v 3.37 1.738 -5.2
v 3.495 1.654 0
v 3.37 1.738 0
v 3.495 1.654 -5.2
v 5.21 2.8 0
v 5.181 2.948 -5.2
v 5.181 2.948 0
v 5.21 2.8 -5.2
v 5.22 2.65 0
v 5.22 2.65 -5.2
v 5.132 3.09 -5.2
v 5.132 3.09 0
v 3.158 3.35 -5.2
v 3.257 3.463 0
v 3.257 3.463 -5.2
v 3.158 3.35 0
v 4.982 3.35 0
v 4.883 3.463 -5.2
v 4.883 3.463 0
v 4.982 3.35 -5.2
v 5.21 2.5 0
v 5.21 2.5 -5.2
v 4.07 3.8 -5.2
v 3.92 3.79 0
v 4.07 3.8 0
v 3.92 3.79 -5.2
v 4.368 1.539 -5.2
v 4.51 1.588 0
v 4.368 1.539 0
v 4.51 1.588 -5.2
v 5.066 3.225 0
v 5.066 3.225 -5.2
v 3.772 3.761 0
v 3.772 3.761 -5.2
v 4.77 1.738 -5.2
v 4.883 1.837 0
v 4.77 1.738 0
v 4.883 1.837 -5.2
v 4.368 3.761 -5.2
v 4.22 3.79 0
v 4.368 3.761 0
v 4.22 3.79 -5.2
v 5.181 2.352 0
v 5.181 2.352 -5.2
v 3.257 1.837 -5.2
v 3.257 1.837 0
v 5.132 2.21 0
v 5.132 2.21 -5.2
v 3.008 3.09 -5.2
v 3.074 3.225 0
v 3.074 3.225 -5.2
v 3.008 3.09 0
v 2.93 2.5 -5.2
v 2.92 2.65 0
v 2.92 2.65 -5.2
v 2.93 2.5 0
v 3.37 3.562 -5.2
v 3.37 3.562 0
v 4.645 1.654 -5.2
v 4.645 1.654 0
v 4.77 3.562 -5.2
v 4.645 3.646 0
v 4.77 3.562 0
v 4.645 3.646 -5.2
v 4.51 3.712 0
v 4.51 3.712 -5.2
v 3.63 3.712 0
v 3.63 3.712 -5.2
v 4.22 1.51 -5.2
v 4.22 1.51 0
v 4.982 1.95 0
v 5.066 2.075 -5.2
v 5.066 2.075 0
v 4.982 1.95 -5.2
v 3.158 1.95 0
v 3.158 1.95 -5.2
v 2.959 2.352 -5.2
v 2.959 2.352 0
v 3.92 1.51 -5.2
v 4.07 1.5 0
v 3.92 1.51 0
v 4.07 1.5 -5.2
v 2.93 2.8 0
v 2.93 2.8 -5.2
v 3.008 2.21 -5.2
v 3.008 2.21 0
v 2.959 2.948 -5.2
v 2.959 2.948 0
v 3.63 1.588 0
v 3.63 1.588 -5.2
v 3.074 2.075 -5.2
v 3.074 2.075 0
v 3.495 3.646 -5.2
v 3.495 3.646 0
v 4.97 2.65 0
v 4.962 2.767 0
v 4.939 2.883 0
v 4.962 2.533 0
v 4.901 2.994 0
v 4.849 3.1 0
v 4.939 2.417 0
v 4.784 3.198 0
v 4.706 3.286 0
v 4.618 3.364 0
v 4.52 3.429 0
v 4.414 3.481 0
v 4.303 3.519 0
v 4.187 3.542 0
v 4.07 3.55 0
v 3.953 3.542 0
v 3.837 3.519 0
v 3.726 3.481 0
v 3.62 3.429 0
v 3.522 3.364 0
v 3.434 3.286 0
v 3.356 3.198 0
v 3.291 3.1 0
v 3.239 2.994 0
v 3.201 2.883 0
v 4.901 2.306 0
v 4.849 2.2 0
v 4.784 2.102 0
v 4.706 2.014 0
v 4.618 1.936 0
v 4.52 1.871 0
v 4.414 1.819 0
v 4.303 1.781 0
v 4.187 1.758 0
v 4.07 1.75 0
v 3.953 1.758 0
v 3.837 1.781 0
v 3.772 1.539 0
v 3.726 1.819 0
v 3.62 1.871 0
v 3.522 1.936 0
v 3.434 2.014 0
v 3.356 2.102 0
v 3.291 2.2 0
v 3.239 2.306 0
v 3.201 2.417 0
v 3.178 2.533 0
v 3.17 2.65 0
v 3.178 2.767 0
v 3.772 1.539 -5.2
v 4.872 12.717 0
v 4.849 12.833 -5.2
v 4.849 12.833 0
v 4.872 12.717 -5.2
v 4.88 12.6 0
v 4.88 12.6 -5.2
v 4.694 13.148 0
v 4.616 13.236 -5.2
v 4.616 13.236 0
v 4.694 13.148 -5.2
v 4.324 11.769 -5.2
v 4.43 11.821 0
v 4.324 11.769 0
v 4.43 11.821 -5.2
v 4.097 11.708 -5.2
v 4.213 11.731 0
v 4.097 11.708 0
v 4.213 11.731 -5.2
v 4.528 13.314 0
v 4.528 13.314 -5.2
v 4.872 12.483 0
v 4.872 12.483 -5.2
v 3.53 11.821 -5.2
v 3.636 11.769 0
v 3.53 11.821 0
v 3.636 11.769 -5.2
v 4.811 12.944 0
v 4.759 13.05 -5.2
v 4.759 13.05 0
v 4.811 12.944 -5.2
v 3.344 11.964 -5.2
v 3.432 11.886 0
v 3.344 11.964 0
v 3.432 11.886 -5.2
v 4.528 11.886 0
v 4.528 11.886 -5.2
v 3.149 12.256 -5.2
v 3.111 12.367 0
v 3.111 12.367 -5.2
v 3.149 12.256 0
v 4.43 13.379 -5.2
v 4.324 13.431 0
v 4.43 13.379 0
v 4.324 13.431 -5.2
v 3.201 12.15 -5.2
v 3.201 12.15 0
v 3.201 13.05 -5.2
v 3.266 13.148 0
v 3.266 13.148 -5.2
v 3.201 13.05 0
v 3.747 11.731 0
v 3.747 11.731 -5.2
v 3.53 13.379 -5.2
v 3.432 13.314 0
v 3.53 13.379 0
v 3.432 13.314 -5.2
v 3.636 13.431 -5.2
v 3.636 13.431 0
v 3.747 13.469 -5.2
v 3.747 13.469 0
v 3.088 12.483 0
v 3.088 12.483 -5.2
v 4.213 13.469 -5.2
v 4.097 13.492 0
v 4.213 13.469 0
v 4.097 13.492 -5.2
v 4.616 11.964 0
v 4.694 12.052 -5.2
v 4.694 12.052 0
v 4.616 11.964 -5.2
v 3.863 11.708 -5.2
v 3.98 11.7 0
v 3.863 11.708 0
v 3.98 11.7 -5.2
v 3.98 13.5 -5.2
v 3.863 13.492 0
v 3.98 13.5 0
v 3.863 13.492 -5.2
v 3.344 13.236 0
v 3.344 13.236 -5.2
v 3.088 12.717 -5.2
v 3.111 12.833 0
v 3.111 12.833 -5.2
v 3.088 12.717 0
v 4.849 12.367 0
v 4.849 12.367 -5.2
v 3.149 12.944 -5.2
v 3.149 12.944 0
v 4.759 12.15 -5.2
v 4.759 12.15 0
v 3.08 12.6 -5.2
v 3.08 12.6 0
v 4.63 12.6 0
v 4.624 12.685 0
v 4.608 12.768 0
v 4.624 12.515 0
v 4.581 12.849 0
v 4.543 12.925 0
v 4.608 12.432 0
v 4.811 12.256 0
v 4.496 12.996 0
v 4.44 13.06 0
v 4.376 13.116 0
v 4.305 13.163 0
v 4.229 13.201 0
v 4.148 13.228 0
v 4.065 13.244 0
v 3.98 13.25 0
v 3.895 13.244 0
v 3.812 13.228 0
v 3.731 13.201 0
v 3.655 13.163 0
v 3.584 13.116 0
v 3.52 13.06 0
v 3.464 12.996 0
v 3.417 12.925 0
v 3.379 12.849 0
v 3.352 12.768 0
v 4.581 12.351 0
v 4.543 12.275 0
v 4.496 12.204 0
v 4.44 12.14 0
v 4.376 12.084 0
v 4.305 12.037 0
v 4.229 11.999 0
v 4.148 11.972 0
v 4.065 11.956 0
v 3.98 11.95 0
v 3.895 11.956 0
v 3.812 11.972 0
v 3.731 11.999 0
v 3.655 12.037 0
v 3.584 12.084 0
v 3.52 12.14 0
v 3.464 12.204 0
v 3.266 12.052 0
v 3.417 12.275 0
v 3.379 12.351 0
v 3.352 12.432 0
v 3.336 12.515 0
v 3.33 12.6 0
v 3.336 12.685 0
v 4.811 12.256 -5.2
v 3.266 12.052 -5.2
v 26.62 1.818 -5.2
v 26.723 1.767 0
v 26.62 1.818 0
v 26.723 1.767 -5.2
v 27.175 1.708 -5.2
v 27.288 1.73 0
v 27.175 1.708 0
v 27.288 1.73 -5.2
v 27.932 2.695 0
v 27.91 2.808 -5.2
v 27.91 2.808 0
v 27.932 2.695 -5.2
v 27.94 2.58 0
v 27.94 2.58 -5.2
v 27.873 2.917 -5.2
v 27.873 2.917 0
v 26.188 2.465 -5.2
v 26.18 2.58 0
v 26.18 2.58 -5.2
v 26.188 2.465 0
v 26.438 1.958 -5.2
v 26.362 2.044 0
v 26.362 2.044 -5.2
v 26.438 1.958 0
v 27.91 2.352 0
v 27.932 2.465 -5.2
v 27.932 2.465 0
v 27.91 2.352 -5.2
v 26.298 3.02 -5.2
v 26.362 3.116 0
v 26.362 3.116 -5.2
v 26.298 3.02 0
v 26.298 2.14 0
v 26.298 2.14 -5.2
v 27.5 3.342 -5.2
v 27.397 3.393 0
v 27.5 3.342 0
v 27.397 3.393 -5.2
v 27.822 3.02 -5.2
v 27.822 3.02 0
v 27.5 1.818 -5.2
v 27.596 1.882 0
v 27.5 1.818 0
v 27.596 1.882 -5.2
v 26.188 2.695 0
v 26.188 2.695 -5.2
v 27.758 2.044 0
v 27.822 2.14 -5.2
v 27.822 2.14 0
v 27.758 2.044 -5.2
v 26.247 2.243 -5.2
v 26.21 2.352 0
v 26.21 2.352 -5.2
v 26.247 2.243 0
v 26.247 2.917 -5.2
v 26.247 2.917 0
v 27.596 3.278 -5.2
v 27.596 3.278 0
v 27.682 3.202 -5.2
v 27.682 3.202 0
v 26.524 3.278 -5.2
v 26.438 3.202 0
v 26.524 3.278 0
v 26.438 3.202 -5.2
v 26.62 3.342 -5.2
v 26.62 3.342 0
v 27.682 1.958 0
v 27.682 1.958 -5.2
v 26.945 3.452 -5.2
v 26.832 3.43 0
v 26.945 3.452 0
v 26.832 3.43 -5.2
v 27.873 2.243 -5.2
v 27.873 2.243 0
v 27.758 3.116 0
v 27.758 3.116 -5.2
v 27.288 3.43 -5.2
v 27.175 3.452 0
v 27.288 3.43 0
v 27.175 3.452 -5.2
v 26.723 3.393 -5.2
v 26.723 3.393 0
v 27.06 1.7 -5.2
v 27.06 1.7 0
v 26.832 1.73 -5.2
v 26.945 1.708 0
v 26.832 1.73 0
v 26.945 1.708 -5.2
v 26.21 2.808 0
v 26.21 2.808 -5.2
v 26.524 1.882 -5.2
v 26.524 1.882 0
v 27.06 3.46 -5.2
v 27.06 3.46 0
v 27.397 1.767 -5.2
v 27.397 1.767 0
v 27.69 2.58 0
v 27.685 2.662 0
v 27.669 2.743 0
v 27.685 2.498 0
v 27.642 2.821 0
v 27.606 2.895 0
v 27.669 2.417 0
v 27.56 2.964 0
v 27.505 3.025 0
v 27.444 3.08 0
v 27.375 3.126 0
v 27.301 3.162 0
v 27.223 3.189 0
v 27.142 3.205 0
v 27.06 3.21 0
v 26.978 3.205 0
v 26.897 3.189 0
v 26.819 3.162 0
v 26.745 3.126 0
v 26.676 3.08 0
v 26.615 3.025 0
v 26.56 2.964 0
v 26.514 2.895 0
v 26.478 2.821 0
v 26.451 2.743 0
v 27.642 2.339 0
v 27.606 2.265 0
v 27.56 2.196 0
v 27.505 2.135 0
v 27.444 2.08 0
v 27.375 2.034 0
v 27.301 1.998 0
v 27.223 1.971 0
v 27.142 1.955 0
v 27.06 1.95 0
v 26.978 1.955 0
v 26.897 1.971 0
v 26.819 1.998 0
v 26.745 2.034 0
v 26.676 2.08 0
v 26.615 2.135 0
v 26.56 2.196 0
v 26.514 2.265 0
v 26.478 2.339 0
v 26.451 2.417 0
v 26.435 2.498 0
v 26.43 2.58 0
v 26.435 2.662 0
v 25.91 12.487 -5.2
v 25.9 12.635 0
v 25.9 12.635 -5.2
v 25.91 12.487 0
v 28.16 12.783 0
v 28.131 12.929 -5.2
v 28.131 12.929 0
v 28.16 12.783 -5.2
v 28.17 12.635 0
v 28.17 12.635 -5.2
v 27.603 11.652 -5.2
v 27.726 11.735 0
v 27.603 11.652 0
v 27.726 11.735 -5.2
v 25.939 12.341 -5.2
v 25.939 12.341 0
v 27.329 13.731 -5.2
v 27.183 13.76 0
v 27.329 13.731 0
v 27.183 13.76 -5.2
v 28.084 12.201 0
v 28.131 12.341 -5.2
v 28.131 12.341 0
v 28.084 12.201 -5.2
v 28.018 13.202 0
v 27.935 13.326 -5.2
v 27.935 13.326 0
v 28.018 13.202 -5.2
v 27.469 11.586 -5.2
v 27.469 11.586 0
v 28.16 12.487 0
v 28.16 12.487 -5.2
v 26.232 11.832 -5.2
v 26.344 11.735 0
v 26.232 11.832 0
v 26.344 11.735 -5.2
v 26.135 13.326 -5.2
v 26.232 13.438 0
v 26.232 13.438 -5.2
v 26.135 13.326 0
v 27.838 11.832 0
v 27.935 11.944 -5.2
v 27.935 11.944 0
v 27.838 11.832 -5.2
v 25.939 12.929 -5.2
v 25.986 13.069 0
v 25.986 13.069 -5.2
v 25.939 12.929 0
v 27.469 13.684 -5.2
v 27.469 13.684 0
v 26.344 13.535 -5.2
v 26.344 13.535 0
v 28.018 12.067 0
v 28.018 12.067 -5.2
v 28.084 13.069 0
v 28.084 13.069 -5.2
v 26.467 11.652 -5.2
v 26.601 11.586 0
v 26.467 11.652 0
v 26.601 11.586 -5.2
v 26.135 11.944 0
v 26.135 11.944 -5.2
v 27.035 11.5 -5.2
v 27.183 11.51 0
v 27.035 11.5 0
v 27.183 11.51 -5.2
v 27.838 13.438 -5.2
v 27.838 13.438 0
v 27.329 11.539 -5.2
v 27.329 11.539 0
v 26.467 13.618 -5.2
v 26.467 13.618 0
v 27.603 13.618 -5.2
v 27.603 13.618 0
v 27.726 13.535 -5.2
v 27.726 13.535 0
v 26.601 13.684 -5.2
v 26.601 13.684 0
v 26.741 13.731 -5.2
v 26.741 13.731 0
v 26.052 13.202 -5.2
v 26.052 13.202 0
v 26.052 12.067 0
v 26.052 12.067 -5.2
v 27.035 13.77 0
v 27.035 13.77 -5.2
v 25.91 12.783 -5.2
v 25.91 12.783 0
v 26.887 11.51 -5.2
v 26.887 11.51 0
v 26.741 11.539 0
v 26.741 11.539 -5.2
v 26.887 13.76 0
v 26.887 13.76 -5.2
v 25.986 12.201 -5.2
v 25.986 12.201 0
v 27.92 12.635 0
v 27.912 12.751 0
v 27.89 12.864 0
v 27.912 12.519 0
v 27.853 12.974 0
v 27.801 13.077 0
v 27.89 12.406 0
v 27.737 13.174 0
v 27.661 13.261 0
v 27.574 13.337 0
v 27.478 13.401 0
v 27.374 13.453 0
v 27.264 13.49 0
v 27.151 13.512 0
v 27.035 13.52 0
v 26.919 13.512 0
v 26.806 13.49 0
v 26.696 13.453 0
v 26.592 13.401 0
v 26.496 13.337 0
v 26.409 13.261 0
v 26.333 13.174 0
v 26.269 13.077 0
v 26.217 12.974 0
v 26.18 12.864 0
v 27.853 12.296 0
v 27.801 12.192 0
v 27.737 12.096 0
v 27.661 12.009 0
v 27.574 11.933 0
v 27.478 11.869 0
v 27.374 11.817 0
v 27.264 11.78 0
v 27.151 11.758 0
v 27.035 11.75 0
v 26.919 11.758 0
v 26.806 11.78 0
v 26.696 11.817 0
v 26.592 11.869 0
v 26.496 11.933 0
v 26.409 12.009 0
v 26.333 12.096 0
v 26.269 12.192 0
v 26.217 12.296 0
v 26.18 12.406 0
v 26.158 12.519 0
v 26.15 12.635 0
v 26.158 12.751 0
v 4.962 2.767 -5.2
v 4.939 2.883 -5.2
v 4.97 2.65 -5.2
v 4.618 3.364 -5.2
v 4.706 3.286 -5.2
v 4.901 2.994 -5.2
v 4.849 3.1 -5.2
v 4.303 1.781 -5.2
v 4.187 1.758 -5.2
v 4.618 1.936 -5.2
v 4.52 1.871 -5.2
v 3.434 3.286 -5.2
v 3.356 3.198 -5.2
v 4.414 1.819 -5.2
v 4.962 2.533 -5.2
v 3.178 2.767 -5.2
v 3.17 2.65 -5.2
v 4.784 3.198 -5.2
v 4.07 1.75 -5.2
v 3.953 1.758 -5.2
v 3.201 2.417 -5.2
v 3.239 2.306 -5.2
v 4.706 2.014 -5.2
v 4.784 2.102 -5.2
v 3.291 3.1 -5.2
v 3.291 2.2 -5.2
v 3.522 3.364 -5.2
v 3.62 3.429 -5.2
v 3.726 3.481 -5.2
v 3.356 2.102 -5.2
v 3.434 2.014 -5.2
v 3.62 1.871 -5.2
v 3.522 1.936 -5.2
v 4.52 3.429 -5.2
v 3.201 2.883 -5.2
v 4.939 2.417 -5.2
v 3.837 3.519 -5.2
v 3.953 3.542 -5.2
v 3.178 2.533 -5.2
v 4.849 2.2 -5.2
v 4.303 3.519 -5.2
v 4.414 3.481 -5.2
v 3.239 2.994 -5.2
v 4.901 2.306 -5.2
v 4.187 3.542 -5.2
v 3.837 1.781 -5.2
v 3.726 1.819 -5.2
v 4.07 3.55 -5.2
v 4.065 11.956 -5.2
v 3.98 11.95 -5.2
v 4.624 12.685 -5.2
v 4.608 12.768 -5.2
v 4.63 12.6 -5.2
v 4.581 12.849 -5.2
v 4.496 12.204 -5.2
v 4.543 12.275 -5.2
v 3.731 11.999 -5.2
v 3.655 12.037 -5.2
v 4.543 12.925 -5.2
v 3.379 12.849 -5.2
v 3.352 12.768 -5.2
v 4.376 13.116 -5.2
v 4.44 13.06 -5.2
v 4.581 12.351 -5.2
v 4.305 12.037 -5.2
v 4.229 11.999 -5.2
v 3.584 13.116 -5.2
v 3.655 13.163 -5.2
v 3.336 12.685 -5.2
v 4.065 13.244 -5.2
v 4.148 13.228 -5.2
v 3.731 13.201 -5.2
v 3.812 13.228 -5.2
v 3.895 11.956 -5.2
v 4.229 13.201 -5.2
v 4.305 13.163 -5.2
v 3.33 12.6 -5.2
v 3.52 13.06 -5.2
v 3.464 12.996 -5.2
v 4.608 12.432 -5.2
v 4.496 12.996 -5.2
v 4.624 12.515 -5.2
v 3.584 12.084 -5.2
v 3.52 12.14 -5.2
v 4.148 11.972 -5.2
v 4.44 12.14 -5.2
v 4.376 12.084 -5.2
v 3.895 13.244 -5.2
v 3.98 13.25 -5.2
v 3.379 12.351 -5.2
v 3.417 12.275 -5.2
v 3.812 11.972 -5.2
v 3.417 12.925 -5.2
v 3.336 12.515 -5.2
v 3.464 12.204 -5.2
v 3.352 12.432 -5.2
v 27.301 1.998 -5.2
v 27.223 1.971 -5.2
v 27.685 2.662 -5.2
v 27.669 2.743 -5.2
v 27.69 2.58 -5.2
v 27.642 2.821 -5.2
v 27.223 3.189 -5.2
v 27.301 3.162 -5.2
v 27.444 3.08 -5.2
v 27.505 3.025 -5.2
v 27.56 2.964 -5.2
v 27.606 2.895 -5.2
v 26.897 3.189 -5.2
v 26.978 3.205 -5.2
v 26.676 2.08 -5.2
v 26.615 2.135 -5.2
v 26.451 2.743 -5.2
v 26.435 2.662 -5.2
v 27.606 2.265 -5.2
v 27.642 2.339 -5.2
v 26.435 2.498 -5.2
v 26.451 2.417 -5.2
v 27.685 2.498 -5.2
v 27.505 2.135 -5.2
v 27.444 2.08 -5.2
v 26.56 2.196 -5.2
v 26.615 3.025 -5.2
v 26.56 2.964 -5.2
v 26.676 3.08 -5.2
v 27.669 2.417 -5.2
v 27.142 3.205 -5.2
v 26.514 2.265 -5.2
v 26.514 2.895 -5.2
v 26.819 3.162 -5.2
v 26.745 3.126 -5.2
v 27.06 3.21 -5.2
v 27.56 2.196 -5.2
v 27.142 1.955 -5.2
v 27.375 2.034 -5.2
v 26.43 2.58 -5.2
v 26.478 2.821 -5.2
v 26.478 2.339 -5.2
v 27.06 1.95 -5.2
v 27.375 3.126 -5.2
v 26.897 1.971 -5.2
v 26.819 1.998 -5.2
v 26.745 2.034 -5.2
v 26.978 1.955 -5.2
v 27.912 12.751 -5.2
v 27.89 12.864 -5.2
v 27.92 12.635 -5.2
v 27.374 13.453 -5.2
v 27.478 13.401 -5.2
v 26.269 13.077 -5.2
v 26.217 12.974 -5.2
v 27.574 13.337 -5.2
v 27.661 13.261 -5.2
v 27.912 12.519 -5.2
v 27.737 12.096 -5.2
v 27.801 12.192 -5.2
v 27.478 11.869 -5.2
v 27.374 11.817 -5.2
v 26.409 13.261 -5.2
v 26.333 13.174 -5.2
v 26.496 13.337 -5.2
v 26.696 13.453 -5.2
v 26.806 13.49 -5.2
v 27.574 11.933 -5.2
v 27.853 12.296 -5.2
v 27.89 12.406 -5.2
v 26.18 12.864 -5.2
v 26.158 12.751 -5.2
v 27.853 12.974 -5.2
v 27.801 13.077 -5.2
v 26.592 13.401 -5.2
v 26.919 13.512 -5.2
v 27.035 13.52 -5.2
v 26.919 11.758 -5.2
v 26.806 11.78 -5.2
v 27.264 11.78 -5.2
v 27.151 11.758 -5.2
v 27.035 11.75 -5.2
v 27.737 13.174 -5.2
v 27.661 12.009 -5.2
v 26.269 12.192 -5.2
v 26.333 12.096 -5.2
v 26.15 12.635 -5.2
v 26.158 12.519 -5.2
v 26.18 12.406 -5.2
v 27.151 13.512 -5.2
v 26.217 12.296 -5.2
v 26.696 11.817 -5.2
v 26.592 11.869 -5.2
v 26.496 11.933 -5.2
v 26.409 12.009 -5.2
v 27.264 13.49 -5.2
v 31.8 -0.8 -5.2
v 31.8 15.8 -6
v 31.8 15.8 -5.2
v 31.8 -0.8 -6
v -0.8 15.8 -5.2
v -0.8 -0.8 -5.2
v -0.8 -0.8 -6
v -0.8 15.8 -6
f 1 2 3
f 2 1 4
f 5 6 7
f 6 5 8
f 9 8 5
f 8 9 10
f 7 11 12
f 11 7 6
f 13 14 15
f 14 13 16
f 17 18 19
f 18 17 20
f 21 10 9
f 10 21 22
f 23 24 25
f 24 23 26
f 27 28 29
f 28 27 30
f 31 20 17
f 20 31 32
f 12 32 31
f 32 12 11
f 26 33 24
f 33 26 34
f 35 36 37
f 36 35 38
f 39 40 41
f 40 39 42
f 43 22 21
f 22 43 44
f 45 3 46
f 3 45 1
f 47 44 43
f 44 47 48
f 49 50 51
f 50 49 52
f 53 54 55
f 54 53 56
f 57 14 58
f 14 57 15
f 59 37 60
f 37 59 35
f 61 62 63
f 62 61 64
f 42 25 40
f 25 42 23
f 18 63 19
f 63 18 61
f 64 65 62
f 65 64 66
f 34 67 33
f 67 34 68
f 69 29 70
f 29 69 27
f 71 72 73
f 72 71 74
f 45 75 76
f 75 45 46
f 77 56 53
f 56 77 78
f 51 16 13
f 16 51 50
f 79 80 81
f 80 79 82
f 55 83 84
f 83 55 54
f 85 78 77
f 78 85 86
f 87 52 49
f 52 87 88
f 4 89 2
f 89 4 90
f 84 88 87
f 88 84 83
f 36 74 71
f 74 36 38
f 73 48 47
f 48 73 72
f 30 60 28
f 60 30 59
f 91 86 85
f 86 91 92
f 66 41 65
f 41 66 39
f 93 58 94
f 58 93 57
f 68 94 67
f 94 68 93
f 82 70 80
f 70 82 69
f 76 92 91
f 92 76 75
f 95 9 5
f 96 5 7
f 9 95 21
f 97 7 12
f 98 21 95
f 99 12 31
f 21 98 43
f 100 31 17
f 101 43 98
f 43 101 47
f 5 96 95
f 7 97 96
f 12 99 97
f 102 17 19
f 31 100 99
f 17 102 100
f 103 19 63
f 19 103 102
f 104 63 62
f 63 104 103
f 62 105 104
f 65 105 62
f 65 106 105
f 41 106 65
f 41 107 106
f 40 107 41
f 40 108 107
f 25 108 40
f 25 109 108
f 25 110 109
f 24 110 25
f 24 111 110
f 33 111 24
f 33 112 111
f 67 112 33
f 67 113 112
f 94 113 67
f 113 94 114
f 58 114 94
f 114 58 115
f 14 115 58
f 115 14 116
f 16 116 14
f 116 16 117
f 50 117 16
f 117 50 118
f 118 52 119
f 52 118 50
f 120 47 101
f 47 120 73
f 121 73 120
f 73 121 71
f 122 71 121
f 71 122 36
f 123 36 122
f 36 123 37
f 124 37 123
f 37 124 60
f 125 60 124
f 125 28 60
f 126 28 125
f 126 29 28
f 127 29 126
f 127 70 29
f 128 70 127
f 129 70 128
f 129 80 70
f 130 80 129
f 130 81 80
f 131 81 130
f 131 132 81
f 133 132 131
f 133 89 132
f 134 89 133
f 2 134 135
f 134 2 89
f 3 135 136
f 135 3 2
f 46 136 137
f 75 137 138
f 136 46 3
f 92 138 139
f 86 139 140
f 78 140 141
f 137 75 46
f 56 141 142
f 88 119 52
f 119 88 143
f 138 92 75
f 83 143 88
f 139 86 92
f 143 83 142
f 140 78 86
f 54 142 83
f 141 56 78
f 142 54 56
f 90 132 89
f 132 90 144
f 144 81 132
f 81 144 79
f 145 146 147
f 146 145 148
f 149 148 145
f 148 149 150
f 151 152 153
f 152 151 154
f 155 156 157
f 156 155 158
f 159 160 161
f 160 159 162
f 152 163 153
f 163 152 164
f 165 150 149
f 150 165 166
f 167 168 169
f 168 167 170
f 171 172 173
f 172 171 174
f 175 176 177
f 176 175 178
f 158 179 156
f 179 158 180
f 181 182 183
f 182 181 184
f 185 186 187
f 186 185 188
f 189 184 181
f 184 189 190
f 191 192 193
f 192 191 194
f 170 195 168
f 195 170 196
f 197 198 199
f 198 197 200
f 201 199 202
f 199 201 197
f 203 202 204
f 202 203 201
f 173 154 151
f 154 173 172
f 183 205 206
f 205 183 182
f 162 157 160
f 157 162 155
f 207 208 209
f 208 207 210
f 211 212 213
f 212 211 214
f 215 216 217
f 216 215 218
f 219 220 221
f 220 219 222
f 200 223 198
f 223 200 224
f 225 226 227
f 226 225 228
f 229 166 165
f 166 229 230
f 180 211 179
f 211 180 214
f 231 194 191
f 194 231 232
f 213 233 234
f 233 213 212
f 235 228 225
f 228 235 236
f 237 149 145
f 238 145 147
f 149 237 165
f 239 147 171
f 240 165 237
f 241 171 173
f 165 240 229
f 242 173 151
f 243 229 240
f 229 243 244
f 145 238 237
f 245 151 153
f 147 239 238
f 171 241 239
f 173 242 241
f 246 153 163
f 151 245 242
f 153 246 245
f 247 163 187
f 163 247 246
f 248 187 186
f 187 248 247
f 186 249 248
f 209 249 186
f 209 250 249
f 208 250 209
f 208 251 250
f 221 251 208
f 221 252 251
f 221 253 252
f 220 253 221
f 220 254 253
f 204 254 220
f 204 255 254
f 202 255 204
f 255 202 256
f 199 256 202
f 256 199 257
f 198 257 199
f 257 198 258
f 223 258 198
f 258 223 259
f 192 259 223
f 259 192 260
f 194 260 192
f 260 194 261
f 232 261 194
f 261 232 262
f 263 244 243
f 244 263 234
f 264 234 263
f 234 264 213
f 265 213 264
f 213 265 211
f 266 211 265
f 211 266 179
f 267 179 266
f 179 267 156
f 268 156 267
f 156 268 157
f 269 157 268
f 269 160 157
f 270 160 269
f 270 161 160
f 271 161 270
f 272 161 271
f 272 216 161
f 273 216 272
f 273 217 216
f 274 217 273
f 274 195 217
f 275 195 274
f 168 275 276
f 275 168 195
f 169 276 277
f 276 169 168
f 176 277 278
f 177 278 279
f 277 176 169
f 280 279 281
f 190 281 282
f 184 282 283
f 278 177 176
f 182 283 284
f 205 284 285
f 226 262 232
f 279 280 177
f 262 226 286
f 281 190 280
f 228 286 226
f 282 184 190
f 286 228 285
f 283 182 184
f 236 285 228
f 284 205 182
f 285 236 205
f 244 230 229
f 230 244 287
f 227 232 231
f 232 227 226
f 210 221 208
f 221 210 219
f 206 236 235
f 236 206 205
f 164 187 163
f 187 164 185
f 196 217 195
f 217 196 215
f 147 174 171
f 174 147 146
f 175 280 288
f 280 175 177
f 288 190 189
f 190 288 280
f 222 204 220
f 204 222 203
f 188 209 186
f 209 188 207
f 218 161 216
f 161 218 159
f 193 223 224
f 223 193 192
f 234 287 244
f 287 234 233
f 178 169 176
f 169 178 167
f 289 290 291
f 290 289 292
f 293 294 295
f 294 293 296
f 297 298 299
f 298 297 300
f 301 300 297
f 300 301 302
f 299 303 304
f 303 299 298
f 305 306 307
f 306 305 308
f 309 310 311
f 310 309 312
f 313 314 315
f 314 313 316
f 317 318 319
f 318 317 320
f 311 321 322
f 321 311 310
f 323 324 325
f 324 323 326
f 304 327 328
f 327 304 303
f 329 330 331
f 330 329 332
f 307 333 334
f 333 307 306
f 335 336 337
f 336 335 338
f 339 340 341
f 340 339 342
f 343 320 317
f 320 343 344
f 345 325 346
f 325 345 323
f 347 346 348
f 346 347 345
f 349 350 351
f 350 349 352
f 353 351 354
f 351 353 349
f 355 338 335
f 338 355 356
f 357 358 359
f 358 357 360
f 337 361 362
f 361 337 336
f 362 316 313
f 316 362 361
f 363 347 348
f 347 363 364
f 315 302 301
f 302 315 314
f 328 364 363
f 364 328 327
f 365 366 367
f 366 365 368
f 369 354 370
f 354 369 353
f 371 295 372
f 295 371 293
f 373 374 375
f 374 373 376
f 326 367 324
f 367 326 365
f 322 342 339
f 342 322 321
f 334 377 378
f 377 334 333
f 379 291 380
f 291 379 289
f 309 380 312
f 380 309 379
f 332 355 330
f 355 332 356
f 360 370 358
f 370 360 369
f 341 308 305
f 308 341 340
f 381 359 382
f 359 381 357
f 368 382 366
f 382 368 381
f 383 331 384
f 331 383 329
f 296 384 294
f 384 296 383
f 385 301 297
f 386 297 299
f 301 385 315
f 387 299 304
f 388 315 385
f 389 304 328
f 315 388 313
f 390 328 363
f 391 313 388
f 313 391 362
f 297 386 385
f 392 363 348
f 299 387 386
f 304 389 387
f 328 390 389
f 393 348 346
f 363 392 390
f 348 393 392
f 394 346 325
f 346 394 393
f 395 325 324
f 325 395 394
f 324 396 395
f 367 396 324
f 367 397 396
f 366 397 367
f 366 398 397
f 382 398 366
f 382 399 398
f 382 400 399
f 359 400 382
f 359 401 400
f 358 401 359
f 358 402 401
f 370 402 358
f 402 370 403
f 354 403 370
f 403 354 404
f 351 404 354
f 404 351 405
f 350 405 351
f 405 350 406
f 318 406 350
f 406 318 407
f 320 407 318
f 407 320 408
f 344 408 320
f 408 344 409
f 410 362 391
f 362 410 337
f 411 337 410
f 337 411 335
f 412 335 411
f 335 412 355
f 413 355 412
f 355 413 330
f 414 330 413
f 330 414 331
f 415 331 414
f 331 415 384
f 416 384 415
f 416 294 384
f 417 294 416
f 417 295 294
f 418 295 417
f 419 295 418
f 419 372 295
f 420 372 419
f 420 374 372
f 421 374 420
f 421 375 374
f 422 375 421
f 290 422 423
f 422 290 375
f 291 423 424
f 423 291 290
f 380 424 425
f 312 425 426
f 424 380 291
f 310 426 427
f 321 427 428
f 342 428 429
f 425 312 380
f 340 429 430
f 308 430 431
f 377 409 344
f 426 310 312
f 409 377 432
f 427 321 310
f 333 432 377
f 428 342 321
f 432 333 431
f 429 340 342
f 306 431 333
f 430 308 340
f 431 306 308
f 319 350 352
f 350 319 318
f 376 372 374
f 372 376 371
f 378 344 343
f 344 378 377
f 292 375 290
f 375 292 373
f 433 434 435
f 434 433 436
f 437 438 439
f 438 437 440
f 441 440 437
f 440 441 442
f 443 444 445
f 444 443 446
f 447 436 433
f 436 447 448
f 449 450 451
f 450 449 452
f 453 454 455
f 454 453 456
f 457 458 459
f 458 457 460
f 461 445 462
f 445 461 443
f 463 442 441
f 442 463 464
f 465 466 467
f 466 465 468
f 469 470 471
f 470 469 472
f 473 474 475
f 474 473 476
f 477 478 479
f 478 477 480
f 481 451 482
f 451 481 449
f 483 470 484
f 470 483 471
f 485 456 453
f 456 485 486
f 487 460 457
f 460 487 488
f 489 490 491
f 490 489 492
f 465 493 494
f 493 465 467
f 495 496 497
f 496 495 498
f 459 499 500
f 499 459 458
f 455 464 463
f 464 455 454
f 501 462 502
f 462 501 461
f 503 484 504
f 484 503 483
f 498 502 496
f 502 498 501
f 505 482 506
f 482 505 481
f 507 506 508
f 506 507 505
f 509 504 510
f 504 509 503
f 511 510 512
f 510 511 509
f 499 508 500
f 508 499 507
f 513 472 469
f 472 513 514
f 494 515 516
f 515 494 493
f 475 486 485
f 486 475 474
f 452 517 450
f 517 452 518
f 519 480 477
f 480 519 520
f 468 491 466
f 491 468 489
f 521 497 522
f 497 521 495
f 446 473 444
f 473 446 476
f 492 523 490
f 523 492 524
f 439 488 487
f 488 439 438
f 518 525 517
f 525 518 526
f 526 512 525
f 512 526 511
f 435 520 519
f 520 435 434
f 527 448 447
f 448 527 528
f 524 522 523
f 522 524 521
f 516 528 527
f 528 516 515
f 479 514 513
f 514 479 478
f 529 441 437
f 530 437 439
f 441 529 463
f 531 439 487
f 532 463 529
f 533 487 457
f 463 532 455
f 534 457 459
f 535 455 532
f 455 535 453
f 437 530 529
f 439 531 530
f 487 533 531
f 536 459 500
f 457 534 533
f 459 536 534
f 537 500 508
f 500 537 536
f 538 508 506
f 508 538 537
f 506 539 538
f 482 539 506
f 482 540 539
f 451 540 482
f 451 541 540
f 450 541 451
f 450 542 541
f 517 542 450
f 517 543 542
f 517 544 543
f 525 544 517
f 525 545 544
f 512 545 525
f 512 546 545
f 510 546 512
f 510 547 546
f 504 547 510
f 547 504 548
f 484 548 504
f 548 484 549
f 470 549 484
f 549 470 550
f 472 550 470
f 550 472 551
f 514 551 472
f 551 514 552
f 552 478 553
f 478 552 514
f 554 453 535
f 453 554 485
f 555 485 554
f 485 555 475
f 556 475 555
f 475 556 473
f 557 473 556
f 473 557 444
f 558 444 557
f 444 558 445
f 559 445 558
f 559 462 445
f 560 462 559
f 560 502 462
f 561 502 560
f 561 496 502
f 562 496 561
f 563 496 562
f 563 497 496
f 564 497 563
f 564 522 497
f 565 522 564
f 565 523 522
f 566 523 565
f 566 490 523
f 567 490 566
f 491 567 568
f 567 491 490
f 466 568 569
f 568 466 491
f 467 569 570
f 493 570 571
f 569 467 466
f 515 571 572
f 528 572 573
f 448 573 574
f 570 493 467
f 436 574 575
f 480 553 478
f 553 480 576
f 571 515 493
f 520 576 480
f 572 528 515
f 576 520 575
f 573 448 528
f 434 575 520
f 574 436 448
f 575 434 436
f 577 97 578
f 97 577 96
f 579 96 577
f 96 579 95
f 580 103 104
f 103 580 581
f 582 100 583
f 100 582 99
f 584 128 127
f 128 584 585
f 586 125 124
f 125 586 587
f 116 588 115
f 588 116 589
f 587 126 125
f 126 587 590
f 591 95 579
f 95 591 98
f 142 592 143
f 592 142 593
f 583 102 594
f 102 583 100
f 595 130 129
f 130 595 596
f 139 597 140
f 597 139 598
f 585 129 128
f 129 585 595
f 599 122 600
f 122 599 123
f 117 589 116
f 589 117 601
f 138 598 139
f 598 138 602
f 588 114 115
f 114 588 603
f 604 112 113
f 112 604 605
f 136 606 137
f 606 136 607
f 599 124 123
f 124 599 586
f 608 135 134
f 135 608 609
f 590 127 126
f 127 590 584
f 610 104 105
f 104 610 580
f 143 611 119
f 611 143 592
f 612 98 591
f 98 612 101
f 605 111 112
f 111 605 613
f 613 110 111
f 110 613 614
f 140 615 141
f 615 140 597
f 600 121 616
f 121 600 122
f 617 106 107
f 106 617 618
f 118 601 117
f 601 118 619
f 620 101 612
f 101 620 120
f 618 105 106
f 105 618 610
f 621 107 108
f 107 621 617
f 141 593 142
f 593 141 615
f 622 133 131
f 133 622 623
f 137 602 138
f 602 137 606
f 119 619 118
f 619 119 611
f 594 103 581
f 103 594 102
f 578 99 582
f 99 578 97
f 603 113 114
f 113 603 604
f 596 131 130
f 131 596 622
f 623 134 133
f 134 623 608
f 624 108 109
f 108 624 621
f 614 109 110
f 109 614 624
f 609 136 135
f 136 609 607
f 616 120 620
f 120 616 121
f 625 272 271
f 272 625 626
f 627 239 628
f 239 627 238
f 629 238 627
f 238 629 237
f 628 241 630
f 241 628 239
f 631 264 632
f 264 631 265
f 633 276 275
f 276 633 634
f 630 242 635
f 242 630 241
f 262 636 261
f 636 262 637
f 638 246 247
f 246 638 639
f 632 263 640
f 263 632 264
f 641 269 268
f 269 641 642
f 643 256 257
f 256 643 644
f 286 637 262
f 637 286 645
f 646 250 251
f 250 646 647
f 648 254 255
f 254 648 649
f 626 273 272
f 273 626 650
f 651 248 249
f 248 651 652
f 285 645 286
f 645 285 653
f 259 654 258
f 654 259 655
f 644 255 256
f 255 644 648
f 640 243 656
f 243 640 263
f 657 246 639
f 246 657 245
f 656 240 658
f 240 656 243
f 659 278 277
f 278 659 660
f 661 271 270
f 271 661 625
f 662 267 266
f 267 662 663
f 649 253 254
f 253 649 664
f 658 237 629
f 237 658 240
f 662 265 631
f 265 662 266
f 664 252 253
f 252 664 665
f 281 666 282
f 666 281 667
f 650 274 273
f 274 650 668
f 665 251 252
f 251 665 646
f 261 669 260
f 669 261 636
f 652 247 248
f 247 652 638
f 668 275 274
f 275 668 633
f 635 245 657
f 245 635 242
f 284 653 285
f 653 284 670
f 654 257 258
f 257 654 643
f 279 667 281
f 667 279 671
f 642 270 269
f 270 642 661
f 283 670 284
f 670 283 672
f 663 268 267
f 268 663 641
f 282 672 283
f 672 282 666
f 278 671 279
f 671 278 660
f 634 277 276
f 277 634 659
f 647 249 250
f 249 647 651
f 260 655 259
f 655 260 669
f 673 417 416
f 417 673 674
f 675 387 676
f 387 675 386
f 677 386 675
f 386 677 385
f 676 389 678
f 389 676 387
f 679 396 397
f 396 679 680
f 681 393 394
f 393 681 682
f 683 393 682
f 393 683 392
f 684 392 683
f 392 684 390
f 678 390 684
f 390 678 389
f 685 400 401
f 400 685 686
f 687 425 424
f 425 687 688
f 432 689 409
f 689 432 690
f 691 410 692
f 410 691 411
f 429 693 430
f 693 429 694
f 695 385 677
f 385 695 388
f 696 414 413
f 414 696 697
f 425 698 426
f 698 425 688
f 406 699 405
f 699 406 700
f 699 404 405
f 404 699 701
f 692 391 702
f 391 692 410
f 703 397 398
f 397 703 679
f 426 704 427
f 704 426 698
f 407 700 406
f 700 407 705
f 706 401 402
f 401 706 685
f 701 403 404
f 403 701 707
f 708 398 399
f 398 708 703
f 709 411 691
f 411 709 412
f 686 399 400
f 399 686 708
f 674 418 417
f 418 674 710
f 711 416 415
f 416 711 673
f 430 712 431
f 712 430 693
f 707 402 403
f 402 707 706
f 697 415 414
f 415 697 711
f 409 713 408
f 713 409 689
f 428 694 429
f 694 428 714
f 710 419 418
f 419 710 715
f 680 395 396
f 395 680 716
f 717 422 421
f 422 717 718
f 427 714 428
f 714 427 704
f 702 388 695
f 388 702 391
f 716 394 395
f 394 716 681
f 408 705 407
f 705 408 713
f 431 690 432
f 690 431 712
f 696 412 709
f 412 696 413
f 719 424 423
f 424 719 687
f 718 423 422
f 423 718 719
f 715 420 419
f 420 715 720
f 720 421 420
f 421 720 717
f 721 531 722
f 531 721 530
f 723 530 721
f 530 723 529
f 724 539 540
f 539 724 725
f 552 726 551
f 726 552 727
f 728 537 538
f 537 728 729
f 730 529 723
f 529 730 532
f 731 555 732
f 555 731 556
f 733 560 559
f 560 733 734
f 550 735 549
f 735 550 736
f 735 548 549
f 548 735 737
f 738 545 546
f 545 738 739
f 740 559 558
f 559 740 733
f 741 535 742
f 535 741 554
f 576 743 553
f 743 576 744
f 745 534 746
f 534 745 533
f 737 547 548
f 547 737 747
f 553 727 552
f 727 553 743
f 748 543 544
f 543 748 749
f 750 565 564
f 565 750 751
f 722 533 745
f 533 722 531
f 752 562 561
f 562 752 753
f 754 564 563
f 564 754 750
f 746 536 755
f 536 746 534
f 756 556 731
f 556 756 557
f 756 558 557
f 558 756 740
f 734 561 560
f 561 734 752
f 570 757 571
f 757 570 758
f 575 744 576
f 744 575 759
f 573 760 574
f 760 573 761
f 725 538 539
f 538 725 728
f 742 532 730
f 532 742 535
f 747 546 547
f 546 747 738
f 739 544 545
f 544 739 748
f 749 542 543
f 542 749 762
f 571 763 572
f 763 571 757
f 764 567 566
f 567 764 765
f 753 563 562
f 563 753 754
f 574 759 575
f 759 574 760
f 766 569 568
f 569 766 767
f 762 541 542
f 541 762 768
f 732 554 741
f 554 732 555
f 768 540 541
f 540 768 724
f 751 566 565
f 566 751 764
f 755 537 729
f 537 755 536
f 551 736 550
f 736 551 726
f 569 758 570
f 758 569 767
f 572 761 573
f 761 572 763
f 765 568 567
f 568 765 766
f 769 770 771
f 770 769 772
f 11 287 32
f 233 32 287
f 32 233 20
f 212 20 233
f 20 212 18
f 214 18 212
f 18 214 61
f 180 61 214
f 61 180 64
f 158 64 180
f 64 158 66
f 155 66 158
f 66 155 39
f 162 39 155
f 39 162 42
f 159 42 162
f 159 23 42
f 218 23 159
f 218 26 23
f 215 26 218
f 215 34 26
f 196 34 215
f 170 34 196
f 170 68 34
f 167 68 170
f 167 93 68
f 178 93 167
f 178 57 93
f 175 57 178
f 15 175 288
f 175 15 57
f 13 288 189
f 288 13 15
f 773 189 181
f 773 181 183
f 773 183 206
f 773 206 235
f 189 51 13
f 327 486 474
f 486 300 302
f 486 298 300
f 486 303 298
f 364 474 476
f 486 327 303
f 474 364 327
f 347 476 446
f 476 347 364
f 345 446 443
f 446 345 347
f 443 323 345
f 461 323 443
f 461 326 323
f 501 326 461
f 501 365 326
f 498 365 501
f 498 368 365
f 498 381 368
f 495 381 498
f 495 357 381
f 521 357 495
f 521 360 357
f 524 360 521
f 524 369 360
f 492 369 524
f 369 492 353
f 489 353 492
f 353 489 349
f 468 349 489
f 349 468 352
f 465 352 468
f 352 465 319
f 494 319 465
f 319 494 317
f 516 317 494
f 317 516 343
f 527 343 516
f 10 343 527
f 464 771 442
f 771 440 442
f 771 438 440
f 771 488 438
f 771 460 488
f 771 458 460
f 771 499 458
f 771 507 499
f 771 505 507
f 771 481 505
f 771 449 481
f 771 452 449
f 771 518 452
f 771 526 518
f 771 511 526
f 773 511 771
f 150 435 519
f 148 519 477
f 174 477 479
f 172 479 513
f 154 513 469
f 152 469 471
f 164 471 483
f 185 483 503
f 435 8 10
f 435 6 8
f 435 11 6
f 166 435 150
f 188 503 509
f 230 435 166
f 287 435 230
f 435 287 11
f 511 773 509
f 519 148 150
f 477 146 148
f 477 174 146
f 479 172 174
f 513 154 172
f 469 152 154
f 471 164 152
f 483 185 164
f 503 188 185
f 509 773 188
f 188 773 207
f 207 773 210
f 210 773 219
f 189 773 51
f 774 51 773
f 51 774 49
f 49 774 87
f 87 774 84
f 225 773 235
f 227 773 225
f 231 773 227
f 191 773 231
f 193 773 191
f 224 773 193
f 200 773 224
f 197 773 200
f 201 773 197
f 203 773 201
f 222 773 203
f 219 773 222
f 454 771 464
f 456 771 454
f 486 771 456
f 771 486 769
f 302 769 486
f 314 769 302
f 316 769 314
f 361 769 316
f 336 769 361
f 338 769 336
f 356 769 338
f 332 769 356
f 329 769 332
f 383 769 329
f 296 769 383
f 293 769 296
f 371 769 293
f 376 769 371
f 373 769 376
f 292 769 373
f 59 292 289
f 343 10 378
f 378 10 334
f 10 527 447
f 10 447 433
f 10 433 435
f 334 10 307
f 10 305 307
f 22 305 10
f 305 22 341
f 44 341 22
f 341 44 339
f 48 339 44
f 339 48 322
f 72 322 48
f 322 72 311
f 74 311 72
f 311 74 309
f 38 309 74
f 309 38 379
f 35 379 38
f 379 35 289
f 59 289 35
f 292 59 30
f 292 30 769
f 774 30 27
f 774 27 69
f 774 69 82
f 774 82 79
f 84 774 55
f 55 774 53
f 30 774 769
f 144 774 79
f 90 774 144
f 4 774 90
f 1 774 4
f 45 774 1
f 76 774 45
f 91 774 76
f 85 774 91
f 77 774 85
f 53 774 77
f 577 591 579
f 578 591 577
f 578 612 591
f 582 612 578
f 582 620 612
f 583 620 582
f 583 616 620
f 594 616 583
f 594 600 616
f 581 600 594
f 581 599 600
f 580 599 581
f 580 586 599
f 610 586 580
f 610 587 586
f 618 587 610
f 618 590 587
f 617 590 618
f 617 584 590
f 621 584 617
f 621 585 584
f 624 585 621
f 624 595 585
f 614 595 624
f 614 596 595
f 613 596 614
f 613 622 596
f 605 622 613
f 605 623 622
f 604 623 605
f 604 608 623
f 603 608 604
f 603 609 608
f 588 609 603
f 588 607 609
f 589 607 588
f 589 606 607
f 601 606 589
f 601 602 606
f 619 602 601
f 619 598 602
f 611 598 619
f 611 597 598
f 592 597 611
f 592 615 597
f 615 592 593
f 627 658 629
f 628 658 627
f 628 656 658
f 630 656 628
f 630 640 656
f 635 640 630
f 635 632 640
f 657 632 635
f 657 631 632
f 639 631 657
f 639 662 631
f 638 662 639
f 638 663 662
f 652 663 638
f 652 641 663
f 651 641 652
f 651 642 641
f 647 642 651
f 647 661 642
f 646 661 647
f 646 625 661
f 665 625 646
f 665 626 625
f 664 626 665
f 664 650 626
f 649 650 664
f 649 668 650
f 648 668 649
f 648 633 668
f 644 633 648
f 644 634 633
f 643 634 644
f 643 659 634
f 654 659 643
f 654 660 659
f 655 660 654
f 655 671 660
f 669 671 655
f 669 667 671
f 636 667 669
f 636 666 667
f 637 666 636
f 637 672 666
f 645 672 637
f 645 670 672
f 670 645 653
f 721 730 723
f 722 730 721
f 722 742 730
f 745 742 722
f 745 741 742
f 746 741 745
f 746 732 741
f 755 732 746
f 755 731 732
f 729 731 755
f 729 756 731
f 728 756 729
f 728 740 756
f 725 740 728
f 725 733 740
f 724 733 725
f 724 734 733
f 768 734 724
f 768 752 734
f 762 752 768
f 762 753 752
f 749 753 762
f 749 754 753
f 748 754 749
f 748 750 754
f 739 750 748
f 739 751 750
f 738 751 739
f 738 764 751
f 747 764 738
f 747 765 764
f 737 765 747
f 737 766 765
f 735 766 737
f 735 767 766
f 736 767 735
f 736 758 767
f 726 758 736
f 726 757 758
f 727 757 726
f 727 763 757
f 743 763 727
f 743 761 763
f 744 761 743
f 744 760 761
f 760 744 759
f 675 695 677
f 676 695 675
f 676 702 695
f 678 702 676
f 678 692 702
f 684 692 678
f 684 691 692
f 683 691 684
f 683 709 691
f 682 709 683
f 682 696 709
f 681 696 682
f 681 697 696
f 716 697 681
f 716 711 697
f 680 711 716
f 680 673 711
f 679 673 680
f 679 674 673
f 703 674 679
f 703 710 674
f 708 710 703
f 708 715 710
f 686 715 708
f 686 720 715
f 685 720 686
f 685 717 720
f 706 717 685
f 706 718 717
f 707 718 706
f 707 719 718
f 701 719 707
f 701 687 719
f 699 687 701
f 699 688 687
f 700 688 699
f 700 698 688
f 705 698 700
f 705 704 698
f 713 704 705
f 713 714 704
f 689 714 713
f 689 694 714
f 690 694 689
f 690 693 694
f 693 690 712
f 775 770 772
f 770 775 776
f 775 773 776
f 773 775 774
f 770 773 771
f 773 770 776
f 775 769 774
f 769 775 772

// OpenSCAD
bluetooth_module_longth = 30+1;//长30mm
bluetooth_module_width = 15;//宽15mm
bluetooth_module_PCB_heigth  = 1.05;//PCB厚度1.05
chip1heigth = 2.64-1.05;
chip1longth = 5.03;
chip1width = 4.11 ;
chip2_heigth = 1.85-1.05;
chip2_longth = 3.98;

button_longth  =5.08;
button_longth2  =3.73;
button_Maxheight = 2.6-bluetooth_module_PCB_heigth;//释放按键时候的厚度
button_Minheight = 2.4-bluetooth_module_PCB_heigth;//按下按键的时候的厚度
button_baseheight = 2.33-bluetooth_module_PCB_heigth;//按键底座厚度
button_baseheight2 = 1.91-bluetooth_module_PCB_heigth;//按键底座厚度
hole1_r = 1.7/2;
hole1_distance_to_x =  1.8+hole1_r;
hole1_distance_to_y =  3.22+hole1_r;
hole2_r = 1.2/2;
hole2_distance_to_x =  12+hole2_r;
hole2_distance_to_y =  3.38+hole2_r;
hole3_r = 1.16/2;
hole3_distance_to_x =  26.48+hole3_r;
hole3_distance_to_y =  2+hole3_r;
hole4_r = 1.67/2;
hole4_distance_to_x =  26.2+hole4_r;
hole4_distance_to_y =  11.8+hole4_r;

btn_distance_to_y_border = 10.03-button_longth;
btn_distance_to_x_border = 9.55-button_longth;

battery_width  =5.2;
support_height = button_Maxheight+bluetooth_module_PCB_heigth+battery_width;

box_border_widht = 0.8;
module MicroUsb()
{
    hull()
    {
        translate([0, (8-6.4)/2, 0])
        cube([5,6.4,2.05]);
        cube(size=[5, 8, 0.95]);
    }
}
            // translate([28, 3.7, -3.7]) 
            //     MicroUsb();
module module_PCBA() {
    // body...
    union()
    {

        translate([btn_distance_to_x_border, btn_distance_to_y_border, bluetooth_module_PCB_heigth]) 
        {
            color([240/255, 240/255, 240/255]) {
                union()//正面按键
                {
                    cube([button_longth,button_longth,button_baseheight2]);
                    translate([(button_longth-button_longth2)/2, (button_longth-button_longth2)/2, 0]) 
                        cube([button_longth2,button_longth2,button_baseheight]);
                    translate([(button_longth)/2, (button_longth)/2, 0]) 
                        cylinder(r=1, h=button_Maxheight, $fn=48);
                }
            }

            
        }
        //PCB
        difference()
        {
            cube(size=[bluetooth_module_longth, bluetooth_module_width, bluetooth_module_PCB_heigth]);//PCB
            union()
            {
                translate([hole1_distance_to_y, hole1_distance_to_x, -0.05]) 
                    cylinder(r=hole1_r,h=bluetooth_module_PCB_heigth+0.1, $fn=48);
                translate([hole2_distance_to_y, hole2_distance_to_x, -0.05]) 
                    cylinder(r=hole2_r,h=bluetooth_module_PCB_heigth+0.1, $fn=48);
                translate([hole3_distance_to_x, hole3_distance_to_y, -0.05]) 
                    cylinder(r=hole3_r,h=bluetooth_module_PCB_heigth+0.1, $fn=48);
                translate([hole4_distance_to_x, hole4_distance_to_y, -0.05]) 
                    cylinder(r=hole4_r,h=bluetooth_module_PCB_heigth+0.1, $fn=48);  
            }
                                             
        }
        union()//底部几个较高的芯片
        {
            color([20/255, 30/255, 30/255]) 
            {
                translate([7.5,9.34 , -chip1heigth]) 
                {
                    cube(size=[chip1width, chip1longth, chip1heigth]);
                }
                translate([15.94,5 , -chip2_heigth]) 
                {
                    cube(size=[chip2_longth, chip2_longth, chip2_heigth]);
                }
            }

            
        }
        
    }

}
module Top()
{
    union()
    {
        translate([0,0,bluetooth_module_PCB_heigth+button_Maxheight])
        difference()//顶盖部分
        {
            cube(size=[bluetooth_module_longth+0.1, bluetooth_module_width+0.1, bluetooth_module_PCB_heigth]);//PCB
            translate([btn_distance_to_x_border, btn_distance_to_y_border, -0.05]) 
            {
                translate([(button_longth)/2, (button_longth)/2, 0])
                {
                    union()
                    {
                        cylinder(r=2.1, h=bluetooth_module_PCB_heigth+0.1, $fn=48);
                        cylinder(r=2.8, h=bluetooth_module_PCB_heigth/2+0.1, $fn=48);
                    }
                    
                } 
                    
            }
        }
        difference()//四周
        {
            
            box_border_height = support_height+bluetooth_module_PCB_heigth+box_border_widht;
            // box_border_height = 2;
            box_border_zoffset = -support_height+button_Maxheight+bluetooth_module_PCB_heigth-box_border_widht;
            translate([-box_border_widht, -box_border_widht, box_border_zoffset]) 
            {
                cube(size=[bluetooth_module_longth+box_border_widht*2, bluetooth_module_width+box_border_widht*2, box_border_height]);//PCB
            }
            translate([0,0, box_border_zoffset-0.05]) 
            cube(size=[bluetooth_module_longth+0.1, bluetooth_module_width+0.1, box_border_height+0.1]);//PCB
            translate([28, 3.7, -3.7]) 
                MicroUsb();
        }
        union()//四个过孔的支柱
        {
            support_height = button_Maxheight+bluetooth_module_PCB_heigth+2;
            support_height_b  = button_Maxheight;
            translate([0,0,bluetooth_module_PCB_heigth+button_Maxheight-support_height])
            union()
            {
                translate([hole1_distance_to_y, hole1_distance_to_x, 0]) 
                    cylinder(r=hole1_r-0.15,h=support_height, $fn=48);
                translate([hole2_distance_to_y, hole2_distance_to_x, 0]) 
                    cylinder(r=hole2_r-0.15,h=support_height, $fn=48);
                translate([hole3_distance_to_x, hole3_distance_to_y, 0]) 
                    cylinder(r=hole3_r-0.15,h=support_height, $fn=48);
                translate([hole4_distance_to_x, hole4_distance_to_y, 0]) 
                    cylinder(r=hole4_r-0.15,h=support_height, $fn=48);  
            }
            translate([0,0,bluetooth_module_PCB_heigth+button_Maxheight-support_height_b])
            union()
            {
                translate([hole1_distance_to_y, hole1_distance_to_x, 0]) 
                    cylinder(r=hole1_r+0.25,h=support_height_b, $fn=48);
                translate([hole2_distance_to_y, hole2_distance_to_x, 0]) 
                    cylinder(r=hole2_r+0.25,h=support_height_b, $fn=48);
                translate([hole3_distance_to_x, hole3_distance_to_y, 0]) 
                    cylinder(r=hole3_r+0.25,h=support_height_b, $fn=48);
                translate([hole4_distance_to_x, hole4_distance_to_y, 0]) 
                    cylinder(r=hole4_r+0.25,h=support_height_b, $fn=48);  
            }
        }
            
    }
}
module button()
{
    translate([0,0,bluetooth_module_PCB_heigth+button_Maxheight])
        translate([btn_distance_to_x_border, btn_distance_to_y_border, 0]) 
        {
            translate([(button_longth)/2, (button_longth)/2, 0])
            {
                difference()
                {
                    union()
                    {
                    cylinder(r=2-0.1, h=bluetooth_module_PCB_heigth+1.2, $fn=48);
                    cylinder(r=2.8-0.3, h=bluetooth_module_PCB_heigth/2-0.05, $fn=48);
                    }
                    cylinder(r=1.08, h=0.1, $fn=48);
                }

            } 
                
        } 
}
module bottom()
{
    union()
    {
            translate([-0.8, -0.8, -box_border_widht-battery_width]) {
        cube(size=[bluetooth_module_longth+1.6, bluetooth_module_width+0.8*2 , box_border_widht]);//P
    }//这里一堆0.8是修改了底盖的方式
        union()//四个过孔的支柱
        {
            support_height = battery_width+0.1+0.7;
            support_height_b  = battery_width+0.7;//0.7是补偿
            translate([0,0,-support_height_b])
            difference()
            {
                union()
                {
                    translate([hole1_distance_to_y, hole1_distance_to_x, 0]) 
                        cylinder(r=hole1_r+0.3,h=support_height_b, $fn=48);
                    translate([hole2_distance_to_y, hole2_distance_to_x, 0]) 
                        cylinder(r=hole2_r+0.3,h=support_height_b, $fn=48);
                    translate([hole3_distance_to_x, hole3_distance_to_y, 0]) 
                        cylinder(r=hole3_r+0.3,h=support_height_b, $fn=48);
                    translate([hole4_distance_to_x, hole4_distance_to_y, 0]) 
                        cylinder(r=hole4_r+0.3,h=support_height_b, $fn=48);  
                }
                union()
                {
                    translate([hole1_distance_to_y, hole1_distance_to_x, 0]) 
                        cylinder(r=hole1_r+0.05,h=support_height, $fn=48);
                    translate([hole2_distance_to_y, hole2_distance_to_x, 0]) 
                        cylinder(r=hole2_r+0.05,h=support_height, $fn=48);
                    translate([hole3_distance_to_x, hole3_distance_to_y, 0]) 
                        cylinder(r=hole3_r+0.05,h=support_height, $fn=48);
                    translate([hole4_distance_to_x, hole4_distance_to_y, 0]) 
                        cylinder(r=hole4_r+0.05,h=support_height, $fn=48);  
                }
            }

            //translate([0,0,bluetooth_module_PCB_heigth+button_Maxheight-support_height_b])

        }
    }

    
}
Top();
button();
module_PCBA();
!bottom();
//截面分析
// intersection()
// {
//     Top();
//     translate([-20,0,0])
//         cube([30,30,30]);
    
// }
